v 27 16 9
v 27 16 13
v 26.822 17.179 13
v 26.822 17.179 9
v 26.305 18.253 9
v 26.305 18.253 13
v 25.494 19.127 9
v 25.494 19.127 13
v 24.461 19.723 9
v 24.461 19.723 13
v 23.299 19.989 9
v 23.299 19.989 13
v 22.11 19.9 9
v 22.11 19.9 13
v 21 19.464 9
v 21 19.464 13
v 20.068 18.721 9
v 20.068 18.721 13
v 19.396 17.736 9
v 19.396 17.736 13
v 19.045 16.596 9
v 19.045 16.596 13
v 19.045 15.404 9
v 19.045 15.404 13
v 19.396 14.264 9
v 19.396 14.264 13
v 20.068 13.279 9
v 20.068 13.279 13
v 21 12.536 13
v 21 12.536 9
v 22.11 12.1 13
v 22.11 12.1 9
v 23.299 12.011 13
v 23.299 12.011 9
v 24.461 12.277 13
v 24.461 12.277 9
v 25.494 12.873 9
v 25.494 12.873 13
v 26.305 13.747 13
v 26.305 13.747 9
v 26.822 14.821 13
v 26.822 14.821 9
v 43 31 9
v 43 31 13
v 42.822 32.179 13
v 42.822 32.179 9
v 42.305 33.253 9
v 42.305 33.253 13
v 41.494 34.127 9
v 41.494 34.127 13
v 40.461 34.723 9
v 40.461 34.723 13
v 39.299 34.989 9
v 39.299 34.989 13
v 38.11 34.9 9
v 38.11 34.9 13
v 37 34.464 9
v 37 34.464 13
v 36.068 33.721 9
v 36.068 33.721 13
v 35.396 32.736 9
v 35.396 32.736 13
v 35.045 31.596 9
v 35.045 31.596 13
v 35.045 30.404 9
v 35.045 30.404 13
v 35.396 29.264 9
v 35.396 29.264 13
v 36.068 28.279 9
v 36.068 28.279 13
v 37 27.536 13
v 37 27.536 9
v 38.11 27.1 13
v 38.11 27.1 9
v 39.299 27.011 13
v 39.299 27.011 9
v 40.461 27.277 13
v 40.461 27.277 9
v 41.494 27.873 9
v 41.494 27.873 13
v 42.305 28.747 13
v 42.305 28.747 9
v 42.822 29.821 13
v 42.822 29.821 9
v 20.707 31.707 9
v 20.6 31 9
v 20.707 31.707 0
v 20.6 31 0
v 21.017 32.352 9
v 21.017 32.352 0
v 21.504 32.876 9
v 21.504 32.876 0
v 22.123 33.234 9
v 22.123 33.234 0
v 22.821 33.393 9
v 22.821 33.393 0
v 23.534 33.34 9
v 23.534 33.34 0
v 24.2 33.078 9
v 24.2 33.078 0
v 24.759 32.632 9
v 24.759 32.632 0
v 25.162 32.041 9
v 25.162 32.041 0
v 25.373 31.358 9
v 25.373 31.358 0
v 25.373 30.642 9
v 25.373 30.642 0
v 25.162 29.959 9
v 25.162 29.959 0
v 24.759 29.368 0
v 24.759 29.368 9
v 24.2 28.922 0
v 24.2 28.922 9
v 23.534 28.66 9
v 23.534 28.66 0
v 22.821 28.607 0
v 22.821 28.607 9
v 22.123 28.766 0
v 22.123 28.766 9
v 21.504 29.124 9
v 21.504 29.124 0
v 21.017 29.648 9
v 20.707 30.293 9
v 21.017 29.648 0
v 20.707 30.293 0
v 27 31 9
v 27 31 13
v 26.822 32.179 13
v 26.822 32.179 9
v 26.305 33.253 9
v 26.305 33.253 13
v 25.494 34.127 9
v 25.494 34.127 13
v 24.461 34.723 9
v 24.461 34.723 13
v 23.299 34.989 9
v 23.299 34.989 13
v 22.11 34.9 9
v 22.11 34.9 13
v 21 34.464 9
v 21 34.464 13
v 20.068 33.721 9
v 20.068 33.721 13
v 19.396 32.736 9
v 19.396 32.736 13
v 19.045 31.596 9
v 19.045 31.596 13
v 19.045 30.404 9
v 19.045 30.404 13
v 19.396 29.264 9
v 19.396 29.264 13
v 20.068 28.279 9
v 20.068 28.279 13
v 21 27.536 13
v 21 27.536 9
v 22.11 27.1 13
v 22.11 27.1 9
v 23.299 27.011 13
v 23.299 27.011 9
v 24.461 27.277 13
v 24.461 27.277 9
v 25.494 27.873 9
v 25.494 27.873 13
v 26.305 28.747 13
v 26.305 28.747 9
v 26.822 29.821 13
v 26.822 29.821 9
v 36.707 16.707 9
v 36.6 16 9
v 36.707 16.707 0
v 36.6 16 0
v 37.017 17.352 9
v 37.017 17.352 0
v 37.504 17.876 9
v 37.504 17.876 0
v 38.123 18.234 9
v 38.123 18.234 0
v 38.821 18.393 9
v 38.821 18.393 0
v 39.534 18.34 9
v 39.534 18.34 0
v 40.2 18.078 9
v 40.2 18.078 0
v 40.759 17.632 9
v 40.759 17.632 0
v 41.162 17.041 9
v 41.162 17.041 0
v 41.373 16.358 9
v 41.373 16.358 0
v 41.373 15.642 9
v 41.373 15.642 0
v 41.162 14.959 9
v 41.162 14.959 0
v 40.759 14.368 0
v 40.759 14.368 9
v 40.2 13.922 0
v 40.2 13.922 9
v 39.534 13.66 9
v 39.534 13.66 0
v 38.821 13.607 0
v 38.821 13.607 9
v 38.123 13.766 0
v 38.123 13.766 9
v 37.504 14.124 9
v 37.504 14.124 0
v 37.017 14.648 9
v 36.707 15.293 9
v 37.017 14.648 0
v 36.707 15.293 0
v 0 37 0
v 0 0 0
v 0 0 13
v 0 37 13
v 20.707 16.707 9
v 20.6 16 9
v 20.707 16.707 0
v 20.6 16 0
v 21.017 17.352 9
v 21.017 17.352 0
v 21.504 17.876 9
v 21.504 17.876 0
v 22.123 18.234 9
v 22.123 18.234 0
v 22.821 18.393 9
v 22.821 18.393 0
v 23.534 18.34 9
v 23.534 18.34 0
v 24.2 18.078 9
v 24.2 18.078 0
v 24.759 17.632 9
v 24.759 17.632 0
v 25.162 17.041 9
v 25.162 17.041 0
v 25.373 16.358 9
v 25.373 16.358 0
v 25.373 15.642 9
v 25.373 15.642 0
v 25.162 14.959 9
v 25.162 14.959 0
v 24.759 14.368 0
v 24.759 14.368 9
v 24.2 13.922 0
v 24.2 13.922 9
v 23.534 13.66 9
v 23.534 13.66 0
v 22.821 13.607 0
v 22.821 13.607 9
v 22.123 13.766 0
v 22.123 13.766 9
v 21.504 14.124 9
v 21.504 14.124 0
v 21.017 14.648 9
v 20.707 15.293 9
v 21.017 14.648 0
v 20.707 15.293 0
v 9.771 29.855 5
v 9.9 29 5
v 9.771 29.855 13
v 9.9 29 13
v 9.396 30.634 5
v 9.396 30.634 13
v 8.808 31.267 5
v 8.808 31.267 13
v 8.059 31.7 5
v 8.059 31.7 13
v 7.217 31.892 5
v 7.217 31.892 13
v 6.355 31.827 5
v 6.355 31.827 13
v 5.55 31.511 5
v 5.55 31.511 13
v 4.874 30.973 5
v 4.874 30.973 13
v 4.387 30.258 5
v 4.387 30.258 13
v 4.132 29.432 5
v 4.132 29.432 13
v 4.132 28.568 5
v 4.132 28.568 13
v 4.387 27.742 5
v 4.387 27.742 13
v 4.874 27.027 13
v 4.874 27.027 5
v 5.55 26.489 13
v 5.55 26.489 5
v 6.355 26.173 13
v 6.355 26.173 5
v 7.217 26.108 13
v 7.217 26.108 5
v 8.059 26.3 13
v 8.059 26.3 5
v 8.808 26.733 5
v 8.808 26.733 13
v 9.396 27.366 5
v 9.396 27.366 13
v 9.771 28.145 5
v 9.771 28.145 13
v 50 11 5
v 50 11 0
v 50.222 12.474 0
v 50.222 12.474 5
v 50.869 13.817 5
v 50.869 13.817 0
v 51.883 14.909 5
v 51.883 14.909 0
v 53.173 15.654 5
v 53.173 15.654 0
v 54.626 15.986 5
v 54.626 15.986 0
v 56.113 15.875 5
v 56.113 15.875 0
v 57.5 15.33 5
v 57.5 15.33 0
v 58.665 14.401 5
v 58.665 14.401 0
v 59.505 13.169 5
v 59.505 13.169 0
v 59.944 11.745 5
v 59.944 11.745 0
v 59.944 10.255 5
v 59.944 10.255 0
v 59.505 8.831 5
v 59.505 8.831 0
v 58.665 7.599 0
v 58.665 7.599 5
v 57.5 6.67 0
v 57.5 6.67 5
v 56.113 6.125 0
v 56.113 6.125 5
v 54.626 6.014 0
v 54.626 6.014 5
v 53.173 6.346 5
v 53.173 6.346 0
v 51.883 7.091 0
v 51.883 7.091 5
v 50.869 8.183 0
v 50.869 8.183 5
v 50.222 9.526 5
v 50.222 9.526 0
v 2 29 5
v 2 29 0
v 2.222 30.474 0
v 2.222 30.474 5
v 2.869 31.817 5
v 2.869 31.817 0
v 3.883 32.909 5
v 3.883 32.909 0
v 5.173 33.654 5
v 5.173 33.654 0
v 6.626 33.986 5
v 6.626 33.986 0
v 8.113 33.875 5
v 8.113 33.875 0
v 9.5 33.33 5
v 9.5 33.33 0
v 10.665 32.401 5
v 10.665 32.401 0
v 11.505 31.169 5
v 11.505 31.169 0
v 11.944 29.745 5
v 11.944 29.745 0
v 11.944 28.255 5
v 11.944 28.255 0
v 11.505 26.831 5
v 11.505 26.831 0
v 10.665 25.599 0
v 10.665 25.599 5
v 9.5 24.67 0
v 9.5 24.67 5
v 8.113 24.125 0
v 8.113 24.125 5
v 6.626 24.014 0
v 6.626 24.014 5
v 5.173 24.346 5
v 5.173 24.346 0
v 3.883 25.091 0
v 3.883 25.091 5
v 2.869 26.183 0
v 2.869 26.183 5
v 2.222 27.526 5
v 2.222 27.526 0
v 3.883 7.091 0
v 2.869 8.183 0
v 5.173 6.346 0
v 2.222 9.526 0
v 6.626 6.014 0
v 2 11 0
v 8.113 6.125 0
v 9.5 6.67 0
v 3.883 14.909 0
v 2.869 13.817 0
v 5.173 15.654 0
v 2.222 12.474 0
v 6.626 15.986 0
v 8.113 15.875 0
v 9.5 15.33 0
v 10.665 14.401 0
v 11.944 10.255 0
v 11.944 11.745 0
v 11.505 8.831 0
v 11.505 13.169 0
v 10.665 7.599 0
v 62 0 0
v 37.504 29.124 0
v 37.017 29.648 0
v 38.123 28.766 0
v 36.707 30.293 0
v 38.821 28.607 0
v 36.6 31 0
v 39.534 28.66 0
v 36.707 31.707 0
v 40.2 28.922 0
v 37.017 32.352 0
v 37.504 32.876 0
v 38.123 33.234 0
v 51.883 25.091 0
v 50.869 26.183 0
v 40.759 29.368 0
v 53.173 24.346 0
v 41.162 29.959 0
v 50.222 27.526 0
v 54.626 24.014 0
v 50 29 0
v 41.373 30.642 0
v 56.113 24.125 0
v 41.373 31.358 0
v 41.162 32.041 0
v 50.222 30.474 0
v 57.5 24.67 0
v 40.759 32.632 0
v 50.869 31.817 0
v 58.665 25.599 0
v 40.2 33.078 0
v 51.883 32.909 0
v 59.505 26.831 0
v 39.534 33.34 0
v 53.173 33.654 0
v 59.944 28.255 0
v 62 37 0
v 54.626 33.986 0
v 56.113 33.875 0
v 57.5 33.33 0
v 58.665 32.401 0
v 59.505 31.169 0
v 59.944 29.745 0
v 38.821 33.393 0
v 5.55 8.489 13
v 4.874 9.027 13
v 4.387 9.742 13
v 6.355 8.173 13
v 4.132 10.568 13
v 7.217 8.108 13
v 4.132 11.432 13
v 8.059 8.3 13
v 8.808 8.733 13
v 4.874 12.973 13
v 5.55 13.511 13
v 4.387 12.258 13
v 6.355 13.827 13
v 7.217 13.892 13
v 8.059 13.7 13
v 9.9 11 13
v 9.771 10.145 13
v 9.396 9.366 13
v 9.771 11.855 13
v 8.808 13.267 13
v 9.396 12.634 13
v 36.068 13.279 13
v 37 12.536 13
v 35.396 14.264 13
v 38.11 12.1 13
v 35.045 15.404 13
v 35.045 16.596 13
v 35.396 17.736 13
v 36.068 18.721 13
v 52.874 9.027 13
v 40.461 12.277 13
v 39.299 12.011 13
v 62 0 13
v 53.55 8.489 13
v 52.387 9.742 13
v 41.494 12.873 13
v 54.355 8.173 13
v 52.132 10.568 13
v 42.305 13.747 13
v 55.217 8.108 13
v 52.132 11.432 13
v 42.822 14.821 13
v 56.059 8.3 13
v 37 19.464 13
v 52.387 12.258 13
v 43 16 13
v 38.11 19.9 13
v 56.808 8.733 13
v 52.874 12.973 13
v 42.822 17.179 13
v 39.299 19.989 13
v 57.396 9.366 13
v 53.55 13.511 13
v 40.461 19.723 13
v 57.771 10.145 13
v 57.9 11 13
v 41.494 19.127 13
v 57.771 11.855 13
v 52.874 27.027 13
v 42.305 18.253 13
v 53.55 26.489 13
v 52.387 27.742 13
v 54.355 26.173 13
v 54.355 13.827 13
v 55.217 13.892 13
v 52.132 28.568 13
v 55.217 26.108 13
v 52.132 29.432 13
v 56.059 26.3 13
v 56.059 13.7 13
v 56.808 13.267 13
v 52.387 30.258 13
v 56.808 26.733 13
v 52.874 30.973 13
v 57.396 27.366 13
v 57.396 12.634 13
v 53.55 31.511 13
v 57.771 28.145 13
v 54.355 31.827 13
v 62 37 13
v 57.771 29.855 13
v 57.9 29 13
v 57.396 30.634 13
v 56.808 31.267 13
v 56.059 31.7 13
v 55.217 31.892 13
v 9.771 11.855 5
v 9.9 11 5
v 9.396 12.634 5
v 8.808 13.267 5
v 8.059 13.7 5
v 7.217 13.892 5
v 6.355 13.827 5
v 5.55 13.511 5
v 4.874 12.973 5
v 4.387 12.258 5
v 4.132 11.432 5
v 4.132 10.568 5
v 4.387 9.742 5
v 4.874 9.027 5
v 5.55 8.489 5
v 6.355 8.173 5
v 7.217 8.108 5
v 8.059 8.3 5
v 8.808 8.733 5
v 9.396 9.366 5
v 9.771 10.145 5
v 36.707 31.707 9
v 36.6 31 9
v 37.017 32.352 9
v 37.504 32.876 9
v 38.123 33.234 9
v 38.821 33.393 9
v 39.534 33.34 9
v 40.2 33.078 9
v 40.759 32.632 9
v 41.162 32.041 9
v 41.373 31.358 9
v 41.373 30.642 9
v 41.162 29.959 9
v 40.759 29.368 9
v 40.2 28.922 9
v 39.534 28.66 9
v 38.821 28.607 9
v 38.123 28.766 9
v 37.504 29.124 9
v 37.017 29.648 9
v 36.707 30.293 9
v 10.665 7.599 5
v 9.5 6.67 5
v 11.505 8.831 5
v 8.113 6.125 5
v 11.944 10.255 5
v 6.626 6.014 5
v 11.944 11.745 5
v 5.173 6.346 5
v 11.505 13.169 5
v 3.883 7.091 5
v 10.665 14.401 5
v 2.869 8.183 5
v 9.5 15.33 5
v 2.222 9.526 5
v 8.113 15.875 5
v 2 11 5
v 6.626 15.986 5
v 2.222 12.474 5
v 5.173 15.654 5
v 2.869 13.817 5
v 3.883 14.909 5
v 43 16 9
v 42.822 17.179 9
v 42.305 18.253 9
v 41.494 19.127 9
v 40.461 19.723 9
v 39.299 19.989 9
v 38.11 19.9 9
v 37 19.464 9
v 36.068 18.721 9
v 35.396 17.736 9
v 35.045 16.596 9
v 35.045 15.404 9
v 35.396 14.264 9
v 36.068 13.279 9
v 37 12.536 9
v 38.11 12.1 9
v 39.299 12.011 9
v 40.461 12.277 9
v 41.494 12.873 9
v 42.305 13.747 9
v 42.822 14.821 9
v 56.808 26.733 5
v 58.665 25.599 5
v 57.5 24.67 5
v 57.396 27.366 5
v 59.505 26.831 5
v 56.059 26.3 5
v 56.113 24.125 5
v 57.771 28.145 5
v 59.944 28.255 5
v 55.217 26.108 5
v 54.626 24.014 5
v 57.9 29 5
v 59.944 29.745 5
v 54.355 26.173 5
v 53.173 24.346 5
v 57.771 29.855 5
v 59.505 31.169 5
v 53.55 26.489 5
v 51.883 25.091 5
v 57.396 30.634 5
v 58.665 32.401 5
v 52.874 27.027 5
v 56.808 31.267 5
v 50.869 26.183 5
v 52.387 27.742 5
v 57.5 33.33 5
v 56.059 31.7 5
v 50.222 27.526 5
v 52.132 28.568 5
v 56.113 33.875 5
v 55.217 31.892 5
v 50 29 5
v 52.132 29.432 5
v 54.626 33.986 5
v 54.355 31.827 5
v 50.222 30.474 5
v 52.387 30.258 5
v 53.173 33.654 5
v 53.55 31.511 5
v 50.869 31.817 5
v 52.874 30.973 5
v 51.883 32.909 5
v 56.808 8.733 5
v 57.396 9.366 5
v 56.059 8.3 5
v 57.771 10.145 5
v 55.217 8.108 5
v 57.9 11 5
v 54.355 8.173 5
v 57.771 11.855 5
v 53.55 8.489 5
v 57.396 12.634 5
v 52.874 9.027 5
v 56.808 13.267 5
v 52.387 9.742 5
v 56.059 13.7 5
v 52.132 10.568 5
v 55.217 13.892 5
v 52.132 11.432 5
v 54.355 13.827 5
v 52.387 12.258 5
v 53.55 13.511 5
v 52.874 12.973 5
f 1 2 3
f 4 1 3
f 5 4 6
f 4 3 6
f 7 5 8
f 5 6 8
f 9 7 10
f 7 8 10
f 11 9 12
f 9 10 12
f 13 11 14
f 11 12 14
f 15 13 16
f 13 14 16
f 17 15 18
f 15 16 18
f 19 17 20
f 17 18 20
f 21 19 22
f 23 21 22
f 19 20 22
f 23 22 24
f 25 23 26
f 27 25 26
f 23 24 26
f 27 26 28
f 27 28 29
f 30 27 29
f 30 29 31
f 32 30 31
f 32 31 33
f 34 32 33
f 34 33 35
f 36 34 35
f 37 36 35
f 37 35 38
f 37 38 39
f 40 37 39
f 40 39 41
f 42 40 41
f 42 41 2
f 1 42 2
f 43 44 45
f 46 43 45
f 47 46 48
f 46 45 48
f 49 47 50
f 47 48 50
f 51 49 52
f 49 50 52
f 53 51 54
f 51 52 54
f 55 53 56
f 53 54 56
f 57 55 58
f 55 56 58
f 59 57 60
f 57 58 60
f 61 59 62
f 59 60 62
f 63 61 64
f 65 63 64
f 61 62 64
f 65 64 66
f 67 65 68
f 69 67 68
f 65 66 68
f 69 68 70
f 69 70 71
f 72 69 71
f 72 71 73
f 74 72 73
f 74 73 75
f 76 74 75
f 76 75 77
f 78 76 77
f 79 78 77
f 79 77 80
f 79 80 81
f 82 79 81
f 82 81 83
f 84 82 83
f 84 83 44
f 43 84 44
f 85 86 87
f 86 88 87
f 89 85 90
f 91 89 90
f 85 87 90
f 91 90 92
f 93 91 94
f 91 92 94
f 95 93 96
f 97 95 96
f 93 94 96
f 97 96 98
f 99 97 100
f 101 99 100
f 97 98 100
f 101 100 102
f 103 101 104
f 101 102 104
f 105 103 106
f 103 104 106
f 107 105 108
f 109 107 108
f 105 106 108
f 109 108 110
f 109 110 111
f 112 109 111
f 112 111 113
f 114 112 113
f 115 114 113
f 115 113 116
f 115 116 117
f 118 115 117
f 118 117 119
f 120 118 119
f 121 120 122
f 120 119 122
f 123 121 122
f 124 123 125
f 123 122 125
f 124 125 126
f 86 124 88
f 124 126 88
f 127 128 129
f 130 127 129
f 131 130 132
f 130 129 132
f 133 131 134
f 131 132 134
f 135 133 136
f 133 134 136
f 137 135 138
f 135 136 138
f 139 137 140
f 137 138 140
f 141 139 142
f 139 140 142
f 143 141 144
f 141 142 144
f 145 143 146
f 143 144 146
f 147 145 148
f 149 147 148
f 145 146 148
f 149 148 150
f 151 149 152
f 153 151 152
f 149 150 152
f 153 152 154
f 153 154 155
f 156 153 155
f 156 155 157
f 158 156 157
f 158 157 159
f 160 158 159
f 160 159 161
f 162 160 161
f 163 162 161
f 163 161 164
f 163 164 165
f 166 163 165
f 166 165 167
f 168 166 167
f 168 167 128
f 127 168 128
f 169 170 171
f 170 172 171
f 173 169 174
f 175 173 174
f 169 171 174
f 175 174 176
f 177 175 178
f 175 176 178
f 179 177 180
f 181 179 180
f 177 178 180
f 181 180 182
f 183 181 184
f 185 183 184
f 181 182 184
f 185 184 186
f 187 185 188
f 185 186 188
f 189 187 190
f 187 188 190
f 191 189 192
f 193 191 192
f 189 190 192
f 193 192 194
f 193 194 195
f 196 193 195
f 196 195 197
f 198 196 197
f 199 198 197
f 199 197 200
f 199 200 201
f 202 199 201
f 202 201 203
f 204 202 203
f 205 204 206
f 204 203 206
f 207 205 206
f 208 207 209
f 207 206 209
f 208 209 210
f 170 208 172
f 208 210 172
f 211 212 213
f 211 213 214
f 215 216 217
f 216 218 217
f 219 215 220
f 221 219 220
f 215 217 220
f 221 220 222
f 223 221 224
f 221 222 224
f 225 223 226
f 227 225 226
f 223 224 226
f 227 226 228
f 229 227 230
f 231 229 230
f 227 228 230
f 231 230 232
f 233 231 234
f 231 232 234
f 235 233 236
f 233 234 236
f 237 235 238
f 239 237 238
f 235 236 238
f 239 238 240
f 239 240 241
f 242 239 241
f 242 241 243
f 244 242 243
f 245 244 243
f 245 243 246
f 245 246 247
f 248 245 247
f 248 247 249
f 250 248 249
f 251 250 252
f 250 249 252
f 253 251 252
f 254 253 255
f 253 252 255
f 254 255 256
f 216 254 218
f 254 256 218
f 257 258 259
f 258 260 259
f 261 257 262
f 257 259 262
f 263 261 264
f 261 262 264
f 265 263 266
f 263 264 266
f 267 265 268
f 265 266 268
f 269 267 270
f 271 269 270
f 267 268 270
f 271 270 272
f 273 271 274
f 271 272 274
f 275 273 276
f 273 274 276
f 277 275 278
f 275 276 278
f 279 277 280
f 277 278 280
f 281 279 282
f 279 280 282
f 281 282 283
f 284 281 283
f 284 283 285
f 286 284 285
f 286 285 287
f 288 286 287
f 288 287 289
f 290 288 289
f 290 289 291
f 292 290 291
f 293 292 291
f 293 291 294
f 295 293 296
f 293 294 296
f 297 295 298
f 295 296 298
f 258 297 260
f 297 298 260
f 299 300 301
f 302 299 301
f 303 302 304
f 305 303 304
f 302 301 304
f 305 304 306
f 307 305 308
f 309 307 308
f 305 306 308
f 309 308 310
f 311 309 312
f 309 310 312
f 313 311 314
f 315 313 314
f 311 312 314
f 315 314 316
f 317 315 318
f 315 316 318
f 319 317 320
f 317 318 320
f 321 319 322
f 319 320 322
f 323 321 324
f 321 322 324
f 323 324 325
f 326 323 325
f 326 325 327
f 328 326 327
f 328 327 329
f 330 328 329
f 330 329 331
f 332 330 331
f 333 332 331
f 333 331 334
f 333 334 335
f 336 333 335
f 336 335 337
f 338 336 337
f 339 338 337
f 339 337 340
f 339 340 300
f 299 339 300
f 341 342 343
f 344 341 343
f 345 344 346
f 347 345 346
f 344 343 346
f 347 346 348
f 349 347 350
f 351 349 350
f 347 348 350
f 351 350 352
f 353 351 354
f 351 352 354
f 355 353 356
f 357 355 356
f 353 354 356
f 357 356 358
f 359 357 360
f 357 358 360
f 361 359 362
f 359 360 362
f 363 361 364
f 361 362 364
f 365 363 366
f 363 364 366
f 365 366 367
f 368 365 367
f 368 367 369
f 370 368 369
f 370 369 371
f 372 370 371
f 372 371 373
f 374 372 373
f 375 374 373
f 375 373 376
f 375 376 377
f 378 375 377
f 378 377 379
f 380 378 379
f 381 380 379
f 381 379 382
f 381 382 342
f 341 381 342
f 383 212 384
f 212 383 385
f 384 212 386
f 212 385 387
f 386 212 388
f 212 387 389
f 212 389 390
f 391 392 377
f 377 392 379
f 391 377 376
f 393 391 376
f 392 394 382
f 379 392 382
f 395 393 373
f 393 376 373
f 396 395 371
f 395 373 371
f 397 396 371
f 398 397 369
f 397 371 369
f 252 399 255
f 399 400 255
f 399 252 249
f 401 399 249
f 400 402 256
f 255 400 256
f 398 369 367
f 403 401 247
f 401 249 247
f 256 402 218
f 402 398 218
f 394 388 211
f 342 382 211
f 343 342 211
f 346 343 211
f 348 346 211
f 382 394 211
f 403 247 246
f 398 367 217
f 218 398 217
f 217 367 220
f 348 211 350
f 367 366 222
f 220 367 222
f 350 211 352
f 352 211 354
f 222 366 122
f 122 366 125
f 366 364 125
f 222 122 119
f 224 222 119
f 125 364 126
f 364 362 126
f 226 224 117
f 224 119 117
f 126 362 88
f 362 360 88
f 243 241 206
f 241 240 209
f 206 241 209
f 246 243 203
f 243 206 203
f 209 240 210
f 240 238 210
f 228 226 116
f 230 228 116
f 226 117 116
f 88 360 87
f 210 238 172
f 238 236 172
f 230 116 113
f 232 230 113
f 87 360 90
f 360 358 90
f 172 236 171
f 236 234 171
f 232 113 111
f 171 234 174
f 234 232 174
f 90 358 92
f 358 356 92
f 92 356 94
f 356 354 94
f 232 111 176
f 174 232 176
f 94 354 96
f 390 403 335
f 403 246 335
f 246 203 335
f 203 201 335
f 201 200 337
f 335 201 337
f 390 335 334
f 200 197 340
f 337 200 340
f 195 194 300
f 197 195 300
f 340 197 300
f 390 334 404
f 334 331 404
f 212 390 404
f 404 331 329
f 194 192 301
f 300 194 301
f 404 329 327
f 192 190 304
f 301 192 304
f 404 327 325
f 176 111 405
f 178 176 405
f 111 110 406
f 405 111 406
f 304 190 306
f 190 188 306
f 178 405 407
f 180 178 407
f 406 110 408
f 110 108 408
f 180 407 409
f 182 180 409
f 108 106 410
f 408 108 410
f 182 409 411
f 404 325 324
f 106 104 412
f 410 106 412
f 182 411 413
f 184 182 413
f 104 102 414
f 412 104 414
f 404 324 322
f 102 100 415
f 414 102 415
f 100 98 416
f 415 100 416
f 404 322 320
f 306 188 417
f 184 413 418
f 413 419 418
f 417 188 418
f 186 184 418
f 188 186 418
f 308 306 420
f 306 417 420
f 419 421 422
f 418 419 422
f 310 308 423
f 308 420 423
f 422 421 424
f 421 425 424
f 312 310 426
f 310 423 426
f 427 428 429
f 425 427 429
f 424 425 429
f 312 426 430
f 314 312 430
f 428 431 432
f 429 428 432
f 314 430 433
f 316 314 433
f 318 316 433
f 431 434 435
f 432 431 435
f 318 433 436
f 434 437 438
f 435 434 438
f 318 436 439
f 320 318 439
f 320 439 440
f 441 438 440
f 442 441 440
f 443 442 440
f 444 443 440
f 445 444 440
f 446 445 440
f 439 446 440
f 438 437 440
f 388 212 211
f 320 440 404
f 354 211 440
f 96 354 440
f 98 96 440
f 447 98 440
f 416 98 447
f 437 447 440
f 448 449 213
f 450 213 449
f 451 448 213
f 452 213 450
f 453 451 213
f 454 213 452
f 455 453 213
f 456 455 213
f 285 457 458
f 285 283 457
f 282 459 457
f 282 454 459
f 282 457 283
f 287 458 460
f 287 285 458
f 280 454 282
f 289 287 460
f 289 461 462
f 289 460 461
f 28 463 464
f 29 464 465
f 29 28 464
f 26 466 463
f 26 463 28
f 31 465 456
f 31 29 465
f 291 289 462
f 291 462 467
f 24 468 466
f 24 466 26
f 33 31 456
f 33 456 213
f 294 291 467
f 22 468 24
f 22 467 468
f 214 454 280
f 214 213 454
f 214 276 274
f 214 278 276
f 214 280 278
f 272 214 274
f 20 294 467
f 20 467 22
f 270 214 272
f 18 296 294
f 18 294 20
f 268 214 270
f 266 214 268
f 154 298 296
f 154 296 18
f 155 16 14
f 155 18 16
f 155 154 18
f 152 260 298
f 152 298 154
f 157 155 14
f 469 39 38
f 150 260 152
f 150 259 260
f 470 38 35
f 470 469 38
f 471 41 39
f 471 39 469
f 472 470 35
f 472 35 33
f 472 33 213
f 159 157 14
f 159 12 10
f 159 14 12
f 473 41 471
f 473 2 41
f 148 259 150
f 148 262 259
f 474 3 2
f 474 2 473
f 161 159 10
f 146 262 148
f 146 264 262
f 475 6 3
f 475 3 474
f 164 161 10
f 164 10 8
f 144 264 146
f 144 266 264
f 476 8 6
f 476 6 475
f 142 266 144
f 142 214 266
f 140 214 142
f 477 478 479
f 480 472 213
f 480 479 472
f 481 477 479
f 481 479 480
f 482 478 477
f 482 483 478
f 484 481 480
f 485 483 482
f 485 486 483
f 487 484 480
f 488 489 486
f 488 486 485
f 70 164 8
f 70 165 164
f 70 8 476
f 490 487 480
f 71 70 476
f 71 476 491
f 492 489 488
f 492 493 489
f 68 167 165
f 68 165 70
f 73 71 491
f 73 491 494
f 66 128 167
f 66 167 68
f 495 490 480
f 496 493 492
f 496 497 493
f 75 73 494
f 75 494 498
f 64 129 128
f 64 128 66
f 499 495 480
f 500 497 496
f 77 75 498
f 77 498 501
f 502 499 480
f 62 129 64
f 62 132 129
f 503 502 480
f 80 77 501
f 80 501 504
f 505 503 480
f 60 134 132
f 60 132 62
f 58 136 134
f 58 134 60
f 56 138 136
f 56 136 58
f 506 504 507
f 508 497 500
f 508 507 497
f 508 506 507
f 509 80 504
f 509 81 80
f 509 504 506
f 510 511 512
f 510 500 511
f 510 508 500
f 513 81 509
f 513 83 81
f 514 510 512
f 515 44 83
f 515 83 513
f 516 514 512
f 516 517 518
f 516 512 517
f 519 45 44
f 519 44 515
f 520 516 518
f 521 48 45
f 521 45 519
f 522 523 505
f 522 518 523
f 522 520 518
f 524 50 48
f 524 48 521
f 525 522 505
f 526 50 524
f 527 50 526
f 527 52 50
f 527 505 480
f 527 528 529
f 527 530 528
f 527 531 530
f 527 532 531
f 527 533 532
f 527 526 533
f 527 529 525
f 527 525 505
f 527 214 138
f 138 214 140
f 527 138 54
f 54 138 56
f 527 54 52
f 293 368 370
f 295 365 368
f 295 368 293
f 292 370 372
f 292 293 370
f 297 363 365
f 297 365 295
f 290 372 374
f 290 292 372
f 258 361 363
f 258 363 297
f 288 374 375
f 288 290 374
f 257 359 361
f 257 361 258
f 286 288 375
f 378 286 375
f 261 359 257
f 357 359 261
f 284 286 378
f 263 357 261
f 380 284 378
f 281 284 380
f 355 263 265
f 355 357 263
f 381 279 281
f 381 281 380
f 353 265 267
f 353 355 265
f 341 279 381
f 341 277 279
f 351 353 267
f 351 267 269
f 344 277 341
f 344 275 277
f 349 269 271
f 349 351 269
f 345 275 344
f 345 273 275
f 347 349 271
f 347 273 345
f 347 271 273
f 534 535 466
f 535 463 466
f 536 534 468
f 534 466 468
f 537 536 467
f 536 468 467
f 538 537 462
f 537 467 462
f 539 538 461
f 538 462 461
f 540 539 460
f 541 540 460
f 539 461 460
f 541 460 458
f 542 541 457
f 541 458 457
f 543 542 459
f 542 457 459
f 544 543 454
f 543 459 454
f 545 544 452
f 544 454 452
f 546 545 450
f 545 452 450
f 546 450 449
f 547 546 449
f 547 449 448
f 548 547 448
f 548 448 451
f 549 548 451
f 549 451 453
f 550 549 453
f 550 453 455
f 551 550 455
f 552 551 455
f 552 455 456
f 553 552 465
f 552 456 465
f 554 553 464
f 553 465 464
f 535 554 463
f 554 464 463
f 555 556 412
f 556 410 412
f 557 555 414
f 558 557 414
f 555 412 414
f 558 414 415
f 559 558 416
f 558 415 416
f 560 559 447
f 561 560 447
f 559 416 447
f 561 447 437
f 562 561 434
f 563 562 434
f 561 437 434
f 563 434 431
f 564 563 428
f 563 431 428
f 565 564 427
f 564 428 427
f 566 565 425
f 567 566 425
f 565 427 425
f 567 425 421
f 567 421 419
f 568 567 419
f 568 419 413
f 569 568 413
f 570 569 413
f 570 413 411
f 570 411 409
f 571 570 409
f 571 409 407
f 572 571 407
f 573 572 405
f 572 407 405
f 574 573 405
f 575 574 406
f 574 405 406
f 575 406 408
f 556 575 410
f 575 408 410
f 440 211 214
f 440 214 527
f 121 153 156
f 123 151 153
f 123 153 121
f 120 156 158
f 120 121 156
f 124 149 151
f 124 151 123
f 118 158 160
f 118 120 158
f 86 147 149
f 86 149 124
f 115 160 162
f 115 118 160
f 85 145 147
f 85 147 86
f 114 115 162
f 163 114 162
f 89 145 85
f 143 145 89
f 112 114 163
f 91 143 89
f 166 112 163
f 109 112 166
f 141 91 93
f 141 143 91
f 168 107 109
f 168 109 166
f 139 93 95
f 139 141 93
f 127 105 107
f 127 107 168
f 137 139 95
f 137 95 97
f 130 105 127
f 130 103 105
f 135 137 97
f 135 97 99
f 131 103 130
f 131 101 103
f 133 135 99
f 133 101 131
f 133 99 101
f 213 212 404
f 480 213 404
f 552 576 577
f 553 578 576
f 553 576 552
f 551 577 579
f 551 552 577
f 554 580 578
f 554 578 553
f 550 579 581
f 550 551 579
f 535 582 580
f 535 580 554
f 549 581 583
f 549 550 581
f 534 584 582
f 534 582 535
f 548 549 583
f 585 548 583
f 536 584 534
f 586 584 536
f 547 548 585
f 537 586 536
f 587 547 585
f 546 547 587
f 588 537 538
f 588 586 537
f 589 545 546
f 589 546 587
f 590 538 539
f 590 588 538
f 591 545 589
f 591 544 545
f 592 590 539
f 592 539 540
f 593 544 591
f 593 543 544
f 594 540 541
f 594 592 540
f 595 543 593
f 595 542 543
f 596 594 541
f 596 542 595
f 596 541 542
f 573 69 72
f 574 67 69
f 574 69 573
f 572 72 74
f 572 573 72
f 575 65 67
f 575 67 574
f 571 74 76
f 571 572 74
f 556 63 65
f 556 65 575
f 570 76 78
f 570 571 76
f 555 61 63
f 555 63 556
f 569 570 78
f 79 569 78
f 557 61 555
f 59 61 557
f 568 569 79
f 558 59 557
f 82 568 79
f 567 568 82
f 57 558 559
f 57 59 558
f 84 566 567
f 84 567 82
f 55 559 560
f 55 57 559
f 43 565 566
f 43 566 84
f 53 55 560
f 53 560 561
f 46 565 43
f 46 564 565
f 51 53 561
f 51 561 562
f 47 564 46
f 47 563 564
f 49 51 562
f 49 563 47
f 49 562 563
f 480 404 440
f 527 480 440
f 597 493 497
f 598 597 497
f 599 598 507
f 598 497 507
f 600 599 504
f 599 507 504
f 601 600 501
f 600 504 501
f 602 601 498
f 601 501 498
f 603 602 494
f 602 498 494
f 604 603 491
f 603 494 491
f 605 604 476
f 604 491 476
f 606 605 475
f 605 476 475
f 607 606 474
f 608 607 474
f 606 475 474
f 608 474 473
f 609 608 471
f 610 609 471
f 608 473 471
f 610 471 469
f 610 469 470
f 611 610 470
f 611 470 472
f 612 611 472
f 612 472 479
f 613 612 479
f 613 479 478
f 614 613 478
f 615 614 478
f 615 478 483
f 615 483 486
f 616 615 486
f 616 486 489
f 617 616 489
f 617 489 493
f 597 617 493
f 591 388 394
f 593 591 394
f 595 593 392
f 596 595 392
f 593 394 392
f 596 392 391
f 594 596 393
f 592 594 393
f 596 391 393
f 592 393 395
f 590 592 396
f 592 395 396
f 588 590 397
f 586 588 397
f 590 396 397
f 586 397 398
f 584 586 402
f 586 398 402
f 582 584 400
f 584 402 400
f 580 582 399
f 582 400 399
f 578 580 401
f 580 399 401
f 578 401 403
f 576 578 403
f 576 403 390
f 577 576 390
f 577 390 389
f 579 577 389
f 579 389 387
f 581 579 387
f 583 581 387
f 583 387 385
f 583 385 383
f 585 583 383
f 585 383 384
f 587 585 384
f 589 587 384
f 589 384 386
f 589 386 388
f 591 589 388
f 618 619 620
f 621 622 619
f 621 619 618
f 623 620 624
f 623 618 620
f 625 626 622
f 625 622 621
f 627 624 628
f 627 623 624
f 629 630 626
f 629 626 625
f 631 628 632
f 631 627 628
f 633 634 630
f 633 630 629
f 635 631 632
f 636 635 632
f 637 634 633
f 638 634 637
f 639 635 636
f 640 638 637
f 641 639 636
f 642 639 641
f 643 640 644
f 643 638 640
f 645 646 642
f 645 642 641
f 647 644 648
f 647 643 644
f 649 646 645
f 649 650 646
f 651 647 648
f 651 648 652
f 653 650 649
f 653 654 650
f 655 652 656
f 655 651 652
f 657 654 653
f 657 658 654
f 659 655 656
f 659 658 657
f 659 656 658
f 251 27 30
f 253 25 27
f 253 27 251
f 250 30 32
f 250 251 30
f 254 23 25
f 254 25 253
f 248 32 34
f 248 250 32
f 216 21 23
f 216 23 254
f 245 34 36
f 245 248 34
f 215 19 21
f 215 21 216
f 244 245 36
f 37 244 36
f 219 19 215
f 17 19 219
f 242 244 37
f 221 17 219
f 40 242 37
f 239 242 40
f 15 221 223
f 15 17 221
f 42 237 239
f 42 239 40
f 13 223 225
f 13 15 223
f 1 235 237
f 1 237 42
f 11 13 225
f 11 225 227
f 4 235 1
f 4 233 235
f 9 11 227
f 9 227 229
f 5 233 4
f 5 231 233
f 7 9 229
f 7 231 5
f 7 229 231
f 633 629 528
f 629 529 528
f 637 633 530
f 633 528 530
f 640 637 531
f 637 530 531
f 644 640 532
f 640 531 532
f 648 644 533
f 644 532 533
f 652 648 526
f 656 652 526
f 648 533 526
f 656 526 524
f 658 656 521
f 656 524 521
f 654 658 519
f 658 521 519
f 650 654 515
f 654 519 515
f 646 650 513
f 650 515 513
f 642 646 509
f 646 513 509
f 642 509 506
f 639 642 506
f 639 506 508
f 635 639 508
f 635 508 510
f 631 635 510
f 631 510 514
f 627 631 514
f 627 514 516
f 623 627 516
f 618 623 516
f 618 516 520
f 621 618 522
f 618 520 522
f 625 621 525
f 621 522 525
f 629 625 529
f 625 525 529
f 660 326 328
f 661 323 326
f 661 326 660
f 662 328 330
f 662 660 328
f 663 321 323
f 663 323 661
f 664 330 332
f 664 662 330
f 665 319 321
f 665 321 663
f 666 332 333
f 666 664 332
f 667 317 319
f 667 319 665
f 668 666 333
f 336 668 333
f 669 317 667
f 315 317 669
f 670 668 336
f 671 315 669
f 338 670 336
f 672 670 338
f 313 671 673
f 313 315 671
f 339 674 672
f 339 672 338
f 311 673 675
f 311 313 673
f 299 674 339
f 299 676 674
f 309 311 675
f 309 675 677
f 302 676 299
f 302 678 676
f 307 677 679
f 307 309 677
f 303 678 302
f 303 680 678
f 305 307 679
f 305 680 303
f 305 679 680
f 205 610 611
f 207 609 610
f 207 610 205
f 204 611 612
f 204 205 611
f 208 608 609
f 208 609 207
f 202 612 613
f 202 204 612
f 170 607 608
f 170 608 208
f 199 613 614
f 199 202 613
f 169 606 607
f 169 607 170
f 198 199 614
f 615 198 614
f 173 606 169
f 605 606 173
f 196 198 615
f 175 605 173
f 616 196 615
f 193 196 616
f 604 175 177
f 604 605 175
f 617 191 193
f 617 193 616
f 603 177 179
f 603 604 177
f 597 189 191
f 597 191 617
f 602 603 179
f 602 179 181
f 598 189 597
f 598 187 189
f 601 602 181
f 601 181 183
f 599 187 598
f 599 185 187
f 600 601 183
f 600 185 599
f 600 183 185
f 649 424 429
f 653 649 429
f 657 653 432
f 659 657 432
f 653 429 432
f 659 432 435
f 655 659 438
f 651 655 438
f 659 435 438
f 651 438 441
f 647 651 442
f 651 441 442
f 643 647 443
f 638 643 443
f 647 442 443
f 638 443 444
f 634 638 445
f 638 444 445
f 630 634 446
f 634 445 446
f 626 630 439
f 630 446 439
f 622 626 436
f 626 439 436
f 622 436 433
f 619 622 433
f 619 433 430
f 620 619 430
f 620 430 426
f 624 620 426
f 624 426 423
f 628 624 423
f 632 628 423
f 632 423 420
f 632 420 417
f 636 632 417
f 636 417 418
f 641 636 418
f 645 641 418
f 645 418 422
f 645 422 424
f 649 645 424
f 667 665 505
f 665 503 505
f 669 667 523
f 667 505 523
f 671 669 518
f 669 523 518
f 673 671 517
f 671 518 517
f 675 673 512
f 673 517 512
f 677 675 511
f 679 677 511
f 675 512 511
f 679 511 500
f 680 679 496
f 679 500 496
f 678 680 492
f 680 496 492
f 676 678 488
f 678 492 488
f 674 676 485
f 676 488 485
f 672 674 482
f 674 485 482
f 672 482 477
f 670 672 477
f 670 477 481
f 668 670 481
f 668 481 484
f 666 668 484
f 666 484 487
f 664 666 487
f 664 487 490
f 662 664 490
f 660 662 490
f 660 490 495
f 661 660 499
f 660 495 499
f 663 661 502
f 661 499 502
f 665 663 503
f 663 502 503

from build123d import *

# Parameters (mm, degrees)
SKETCH_1_W                   = 62
SKETCH_1_H                   = 37
EXTRUDE_1_DEPTH              = 13
HOLE_WIZARD_M5_1_D           = 5.8
HOLE_WIZARD_M5_1_CBORE_D     = 10
HOLE_WIZARD_M5_1_CBORE_DEPTH = 5
HOLE_WIZARD_M4_3_D           = 4.8
HOLE_WIZARD_M4_3_CBORE_D     = 8
HOLE_WIZARD_M4_3_CBORE_DEPTH = 4


with BuildPart() as part:
    # 草图1 → 凸台-拉伸1 (new body)
    with BuildSketch(Plane.XY):
        with Locations((31, 18.5)):
            Rectangle(SKETCH_1_W, SKETCH_1_H)
    extrude(amount=EXTRUDE_1_DEPTH)

    # M5 六角凹头螺钉的柱形沉头孔1 (through all)
    with Locations(Plane(origin=(0, 0, 0), x_dir=(-1, 0, 0), z_dir=(0, 0, -1))):
        with Locations((-7, 11), (-7, 29), (-55, 11), (-55, 29)):
            CounterBoreHole(HOLE_WIZARD_M5_1_D / 2, HOLE_WIZARD_M5_1_CBORE_D / 2, HOLE_WIZARD_M5_1_CBORE_DEPTH)

    # M4 六角凹头螺钉的柱形沉头孔3 (through all)
    with Locations(Plane.XY.offset(13)):
        with Locations((39, 16), (23, 16), (23, 31), (39, 31)):
            CounterBoreHole(HOLE_WIZARD_M4_3_D / 2, HOLE_WIZARD_M4_3_CBORE_D / 2, HOLE_WIZARD_M4_3_CBORE_DEPTH)


solid = part.part
